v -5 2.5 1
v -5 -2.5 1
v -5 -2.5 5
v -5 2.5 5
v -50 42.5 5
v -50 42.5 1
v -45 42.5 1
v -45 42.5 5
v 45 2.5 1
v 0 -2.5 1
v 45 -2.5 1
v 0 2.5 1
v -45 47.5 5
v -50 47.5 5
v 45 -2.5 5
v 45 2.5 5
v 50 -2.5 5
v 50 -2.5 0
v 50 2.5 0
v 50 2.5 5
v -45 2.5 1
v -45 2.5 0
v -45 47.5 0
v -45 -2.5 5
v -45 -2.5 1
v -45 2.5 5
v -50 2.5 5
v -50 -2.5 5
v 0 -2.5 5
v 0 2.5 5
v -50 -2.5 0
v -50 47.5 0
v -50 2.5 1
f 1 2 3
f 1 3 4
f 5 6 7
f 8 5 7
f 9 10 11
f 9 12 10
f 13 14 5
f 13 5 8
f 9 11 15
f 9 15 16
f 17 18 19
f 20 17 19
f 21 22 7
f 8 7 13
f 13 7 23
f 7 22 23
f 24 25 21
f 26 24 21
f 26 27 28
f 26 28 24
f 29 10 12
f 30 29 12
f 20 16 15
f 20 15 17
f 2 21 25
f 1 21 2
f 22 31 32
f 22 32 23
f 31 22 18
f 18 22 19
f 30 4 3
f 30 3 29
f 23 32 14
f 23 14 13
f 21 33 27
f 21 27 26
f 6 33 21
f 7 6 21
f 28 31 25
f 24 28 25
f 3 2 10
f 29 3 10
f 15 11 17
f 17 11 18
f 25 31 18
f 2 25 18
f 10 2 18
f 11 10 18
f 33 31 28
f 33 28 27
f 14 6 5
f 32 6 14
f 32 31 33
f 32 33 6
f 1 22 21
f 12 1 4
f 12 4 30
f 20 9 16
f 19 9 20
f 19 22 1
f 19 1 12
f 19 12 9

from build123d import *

# Parameters (mm, degrees)
F0_W     = 5
F0_H     = 5
F1_DEPTH = 5
F0_W_2   = 45
F0_W_3   = 40
F0_H_2   = 40
F2_DEPTH = 1


# Not quite as in the source:
# - a feature of the source that left no trace in its solid (it failed there, or was rolled back) is left out


with BuildPart() as f1:
    # F0 (on Top) → F1 (new body)
    with BuildSketch(Plane.XY):
        with Locations((-47.5, 45)):
            Rectangle(F0_W, F0_H)
    extrude(amount=F1_DEPTH)



with BuildPart() as f1b:
    # F0 (on Top) → F1, piece 2 (new body)
    with BuildSketch(Plane.XY):
        with Locations((-47.5, 0)):
            Rectangle(F0_W, F0_H)
    extrude(amount=F1_DEPTH)


with BuildPart() as f1c:
    # F0 (on Top) → F1, piece 3 (new body)
    with BuildSketch(Plane.XY):
        with Locations((-2.5, 0)):
            Rectangle(F0_W, F0_H)
    extrude(amount=F1_DEPTH)


with BuildPart() as f1d:
    # F0 (on Top) → F1, piece 4 (new body)
    with BuildSketch(Plane.XY):
        with Locations((47.5, 0)):
            Rectangle(F0_W, F0_H)
    extrude(amount=F1_DEPTH)


with BuildPart() as f1_1:
    add(f1.part)

    add(f1b.part)  # F2 merges F1b

    add(f1c.part)  # F2 merges F1c

    add(f1d.part)  # F2 merges F1d
    # F0 (on Top) → F2 (join)
    with BuildSketch(Plane.XY):
        with Locations((47.5, 0)):
            Rectangle(F0_W, F0_H)
        with Locations((22.5, 0)):
            Rectangle(F0_W_2, F0_H)
        with Locations((-2.5, 0)):
            Rectangle(F0_W, F0_H)
        with Locations((-25, 0)):
            Rectangle(F0_W_3, F0_H)
        with Locations((-47.5, 0)):
            Rectangle(F0_W, F0_H)
        with Locations((-47.5, 22.5)):
            Rectangle(F0_W, F0_H_2)
        with Locations((-47.5, 45)):
            Rectangle(F0_W, F0_H)
    extrude(amount=F2_DEPTH)


solid = f1_1.part
